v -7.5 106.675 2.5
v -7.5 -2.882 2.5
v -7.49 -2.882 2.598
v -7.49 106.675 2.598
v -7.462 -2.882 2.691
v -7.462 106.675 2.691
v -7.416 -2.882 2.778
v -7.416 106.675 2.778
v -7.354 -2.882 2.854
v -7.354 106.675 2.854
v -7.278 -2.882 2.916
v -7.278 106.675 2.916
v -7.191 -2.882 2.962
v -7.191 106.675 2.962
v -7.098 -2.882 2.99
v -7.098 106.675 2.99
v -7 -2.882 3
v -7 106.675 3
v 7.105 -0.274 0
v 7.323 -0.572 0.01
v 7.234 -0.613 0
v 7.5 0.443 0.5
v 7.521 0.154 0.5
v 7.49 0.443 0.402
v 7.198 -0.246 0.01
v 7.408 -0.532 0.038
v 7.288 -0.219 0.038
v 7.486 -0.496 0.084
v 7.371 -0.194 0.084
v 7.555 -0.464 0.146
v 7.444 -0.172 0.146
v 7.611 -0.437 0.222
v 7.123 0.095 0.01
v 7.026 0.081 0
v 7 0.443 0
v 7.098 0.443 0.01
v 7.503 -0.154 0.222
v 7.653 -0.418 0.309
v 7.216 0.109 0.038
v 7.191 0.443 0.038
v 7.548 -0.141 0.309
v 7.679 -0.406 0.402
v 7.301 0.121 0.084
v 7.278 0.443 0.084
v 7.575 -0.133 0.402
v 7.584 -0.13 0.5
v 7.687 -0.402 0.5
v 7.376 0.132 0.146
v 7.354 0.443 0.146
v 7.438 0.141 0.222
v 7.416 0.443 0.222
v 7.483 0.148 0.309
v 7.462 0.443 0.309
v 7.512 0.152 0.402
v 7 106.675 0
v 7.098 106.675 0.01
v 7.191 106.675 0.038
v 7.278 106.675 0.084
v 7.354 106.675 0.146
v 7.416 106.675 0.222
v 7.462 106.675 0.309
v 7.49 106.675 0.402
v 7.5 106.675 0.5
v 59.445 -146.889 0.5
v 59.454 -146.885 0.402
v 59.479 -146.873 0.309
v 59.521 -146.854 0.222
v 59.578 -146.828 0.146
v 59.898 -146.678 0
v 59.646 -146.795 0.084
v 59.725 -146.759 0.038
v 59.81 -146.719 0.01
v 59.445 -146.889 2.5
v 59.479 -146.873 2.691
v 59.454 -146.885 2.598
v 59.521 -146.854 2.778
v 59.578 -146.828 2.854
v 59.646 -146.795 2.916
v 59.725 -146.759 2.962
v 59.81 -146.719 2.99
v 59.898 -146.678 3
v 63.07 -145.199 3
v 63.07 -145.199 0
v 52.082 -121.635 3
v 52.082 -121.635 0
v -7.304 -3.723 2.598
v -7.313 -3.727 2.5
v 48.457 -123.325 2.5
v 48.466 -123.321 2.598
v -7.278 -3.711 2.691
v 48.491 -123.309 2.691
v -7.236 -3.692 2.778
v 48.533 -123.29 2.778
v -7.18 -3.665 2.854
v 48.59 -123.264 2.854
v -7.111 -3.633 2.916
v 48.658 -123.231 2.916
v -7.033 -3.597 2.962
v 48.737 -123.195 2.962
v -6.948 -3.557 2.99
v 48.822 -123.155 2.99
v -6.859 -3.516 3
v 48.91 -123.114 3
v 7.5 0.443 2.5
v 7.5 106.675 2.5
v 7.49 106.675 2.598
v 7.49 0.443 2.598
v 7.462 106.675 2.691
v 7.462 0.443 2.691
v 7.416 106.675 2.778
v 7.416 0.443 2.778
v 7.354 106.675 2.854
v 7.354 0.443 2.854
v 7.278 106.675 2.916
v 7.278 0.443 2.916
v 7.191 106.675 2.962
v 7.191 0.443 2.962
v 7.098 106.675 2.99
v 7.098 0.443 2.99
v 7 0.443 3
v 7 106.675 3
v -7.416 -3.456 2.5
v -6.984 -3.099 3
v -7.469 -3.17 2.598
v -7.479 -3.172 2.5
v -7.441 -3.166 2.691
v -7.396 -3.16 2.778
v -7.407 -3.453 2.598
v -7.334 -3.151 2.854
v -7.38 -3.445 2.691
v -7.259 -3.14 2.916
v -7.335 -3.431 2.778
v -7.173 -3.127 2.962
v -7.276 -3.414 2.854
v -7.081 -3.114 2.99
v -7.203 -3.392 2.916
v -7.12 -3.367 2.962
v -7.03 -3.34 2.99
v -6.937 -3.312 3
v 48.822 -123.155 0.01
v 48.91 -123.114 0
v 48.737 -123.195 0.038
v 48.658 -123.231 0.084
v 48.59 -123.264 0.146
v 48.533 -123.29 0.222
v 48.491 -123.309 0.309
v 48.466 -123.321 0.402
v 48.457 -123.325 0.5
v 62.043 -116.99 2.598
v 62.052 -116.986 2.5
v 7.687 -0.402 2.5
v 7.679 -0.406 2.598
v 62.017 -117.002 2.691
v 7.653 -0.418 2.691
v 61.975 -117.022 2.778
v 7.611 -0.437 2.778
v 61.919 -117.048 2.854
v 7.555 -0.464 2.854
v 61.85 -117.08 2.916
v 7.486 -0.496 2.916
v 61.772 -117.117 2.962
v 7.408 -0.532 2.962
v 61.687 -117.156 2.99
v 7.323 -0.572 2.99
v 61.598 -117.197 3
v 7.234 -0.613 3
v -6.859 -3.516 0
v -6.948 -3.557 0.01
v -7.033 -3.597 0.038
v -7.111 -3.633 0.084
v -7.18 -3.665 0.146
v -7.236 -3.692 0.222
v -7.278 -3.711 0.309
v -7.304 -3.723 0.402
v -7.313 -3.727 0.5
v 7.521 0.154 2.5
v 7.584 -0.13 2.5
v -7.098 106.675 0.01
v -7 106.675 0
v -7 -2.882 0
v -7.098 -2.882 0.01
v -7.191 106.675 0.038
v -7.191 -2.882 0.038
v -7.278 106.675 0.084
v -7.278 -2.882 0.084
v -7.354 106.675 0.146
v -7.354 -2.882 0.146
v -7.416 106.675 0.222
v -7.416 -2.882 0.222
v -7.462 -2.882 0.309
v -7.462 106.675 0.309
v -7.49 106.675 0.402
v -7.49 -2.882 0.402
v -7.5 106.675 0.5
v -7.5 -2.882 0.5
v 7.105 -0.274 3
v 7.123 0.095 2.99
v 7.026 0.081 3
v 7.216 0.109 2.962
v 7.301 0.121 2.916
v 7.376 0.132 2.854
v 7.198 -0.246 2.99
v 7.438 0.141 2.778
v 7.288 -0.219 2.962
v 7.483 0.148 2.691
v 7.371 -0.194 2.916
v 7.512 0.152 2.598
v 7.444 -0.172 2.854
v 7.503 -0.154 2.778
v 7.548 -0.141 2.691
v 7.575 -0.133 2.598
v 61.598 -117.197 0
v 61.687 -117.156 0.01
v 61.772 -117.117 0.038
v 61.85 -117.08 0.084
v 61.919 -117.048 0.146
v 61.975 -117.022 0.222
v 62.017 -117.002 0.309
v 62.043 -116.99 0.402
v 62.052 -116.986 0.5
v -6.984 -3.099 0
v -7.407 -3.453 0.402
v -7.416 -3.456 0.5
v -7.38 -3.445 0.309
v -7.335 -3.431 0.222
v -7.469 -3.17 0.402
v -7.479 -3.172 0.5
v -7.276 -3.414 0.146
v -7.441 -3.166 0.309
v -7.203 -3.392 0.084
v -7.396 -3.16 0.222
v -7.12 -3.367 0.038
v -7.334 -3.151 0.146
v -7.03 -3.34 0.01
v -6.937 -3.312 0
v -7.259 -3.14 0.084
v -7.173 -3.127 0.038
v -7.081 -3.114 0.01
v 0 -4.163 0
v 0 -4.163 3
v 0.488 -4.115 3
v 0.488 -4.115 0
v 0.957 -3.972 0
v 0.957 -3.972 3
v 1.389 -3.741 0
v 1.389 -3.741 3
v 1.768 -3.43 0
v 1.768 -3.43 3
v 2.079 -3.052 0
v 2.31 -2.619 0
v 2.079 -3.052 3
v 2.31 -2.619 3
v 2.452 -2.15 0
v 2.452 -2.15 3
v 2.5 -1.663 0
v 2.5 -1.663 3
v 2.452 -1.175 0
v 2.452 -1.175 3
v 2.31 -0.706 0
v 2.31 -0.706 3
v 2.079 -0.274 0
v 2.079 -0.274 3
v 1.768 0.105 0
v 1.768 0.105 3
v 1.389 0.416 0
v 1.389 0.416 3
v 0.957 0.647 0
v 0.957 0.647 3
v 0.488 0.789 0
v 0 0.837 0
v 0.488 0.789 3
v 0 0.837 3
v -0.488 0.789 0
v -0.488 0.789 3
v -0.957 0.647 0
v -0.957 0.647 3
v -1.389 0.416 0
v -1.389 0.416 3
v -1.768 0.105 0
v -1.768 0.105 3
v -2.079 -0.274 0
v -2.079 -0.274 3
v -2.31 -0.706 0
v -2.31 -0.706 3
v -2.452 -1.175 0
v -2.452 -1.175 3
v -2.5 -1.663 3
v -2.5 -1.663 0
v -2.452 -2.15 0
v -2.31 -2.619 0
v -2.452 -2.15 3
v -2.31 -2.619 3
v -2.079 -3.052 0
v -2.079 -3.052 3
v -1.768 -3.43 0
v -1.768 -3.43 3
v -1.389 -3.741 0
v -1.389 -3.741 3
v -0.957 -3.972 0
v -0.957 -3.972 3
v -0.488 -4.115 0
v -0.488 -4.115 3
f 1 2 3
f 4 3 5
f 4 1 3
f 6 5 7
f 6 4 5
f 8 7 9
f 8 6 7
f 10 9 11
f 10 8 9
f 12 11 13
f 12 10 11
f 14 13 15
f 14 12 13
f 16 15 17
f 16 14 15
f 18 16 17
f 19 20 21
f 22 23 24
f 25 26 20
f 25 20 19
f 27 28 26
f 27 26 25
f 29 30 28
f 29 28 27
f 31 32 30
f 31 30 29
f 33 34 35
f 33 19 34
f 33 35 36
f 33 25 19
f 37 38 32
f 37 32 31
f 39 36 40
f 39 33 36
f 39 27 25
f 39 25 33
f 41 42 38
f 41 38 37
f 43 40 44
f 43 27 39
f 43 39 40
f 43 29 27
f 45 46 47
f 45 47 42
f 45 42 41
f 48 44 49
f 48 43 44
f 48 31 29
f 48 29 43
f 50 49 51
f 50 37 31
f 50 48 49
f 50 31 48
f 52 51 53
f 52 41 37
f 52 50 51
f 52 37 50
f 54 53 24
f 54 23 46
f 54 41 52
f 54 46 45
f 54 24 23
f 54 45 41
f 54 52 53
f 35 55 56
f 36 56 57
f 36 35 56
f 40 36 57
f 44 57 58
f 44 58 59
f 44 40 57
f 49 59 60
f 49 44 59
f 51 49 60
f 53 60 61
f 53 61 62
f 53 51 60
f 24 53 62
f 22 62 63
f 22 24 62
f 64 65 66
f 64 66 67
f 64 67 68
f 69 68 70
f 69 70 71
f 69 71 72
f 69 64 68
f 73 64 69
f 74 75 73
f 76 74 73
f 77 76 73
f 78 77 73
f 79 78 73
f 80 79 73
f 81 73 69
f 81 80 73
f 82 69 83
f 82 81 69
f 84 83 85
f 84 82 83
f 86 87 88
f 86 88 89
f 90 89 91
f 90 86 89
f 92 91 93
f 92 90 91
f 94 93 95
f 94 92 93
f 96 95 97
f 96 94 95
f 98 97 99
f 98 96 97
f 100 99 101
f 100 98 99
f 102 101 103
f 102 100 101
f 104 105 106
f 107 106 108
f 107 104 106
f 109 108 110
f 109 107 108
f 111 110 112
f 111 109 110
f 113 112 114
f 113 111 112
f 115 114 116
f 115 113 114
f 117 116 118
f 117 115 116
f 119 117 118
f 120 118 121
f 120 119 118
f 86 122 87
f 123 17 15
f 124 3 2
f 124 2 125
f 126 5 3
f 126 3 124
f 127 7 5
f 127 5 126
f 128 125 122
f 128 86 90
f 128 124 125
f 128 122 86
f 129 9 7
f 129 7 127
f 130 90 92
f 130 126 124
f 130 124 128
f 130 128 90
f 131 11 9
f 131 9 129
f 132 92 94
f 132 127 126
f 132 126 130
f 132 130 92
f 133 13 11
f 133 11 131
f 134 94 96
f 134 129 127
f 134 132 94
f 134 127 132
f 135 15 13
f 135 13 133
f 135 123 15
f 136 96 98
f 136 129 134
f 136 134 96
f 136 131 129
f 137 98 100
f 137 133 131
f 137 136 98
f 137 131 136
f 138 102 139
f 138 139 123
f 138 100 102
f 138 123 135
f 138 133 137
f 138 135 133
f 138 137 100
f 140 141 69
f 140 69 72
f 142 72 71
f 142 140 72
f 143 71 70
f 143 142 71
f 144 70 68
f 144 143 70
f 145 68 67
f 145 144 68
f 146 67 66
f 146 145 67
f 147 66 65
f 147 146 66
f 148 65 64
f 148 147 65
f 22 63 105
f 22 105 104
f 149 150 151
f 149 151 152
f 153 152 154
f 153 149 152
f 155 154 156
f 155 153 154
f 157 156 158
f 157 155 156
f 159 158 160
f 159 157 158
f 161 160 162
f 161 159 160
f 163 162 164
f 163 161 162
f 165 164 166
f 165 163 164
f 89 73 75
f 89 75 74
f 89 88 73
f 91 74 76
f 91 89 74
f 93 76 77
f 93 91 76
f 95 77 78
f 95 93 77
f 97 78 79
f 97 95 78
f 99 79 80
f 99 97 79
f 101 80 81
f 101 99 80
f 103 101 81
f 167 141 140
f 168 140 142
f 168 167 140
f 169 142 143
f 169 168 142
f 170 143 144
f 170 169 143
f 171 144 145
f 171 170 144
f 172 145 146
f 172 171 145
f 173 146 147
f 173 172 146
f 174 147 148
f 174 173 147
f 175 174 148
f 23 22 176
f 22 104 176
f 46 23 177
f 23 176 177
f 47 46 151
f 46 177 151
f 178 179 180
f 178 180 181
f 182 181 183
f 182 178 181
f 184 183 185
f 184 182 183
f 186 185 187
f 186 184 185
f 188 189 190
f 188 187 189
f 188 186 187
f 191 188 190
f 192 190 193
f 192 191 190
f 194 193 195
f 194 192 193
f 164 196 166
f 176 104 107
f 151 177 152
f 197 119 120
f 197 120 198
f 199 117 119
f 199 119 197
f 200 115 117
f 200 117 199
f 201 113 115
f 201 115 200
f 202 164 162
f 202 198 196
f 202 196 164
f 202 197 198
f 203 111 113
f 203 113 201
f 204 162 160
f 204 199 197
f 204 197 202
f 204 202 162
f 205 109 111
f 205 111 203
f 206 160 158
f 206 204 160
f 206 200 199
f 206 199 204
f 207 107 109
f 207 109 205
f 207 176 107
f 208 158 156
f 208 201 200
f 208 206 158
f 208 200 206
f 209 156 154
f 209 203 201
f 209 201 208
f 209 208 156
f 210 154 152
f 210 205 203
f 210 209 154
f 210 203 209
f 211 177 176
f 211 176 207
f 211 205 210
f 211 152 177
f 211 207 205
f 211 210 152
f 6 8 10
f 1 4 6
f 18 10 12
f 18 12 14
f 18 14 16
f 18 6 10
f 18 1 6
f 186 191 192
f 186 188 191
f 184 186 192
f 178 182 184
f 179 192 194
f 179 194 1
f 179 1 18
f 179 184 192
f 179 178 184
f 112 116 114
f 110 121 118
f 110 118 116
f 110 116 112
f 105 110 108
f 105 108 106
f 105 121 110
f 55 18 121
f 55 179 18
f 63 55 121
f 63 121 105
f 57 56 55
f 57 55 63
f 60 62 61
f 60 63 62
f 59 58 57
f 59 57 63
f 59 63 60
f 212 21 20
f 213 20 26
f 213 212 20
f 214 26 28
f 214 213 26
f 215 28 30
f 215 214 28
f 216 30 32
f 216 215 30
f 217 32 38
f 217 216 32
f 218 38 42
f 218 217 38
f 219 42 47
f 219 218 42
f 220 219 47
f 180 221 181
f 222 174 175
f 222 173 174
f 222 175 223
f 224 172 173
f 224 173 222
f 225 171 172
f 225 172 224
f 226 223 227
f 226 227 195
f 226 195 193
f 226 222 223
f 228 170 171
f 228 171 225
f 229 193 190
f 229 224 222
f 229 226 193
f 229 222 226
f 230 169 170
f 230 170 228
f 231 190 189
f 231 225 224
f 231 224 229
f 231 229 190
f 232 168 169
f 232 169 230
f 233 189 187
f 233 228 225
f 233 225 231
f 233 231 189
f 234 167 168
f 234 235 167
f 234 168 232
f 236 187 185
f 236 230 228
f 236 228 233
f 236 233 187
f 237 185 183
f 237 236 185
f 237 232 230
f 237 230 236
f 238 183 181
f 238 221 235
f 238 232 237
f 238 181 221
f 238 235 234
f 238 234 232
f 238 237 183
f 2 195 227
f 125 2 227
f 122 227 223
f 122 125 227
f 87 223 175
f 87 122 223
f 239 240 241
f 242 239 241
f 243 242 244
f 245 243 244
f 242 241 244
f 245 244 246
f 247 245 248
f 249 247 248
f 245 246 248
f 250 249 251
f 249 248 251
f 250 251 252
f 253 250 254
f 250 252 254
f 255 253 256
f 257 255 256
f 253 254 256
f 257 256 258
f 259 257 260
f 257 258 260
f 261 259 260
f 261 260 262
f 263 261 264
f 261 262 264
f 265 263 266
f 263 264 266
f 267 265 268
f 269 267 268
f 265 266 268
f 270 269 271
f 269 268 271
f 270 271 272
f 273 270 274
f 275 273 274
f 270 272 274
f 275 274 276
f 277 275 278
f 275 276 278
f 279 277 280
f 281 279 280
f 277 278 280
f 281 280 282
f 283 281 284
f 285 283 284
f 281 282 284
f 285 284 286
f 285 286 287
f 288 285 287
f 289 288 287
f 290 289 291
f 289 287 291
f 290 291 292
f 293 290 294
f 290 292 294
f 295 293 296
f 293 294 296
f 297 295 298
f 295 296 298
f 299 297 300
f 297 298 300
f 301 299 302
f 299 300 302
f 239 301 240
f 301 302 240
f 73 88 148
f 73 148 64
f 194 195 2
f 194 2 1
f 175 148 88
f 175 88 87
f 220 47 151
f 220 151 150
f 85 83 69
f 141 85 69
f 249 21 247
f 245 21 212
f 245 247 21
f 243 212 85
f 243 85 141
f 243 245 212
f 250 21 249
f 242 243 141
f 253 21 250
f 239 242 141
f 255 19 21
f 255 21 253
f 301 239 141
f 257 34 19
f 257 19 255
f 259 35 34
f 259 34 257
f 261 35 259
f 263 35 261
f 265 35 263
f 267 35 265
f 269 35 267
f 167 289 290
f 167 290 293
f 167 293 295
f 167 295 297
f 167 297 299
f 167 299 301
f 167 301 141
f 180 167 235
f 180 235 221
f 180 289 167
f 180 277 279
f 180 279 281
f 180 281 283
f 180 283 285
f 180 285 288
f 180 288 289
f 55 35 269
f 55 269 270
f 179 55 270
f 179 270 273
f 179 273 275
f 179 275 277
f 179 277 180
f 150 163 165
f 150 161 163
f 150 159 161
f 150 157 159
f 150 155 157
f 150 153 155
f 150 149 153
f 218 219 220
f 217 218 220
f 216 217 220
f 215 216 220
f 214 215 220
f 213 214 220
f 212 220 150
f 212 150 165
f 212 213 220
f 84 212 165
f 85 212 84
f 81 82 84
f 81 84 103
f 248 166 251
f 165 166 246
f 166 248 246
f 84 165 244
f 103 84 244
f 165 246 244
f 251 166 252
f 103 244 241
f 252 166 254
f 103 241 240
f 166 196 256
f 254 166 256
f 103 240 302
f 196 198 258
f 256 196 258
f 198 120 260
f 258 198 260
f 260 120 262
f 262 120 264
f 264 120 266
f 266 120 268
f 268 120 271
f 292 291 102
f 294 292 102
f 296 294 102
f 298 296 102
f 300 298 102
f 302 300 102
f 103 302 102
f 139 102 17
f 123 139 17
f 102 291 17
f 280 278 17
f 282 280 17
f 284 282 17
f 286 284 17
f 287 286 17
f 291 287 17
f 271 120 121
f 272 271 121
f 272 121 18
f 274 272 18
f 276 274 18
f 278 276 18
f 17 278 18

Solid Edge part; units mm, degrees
sketch "Sketch1" plane through (0, 0, 0) normal (0, 0, 1) x (1, 0, 0)
  line L0 (48.4569, -123.3254) -> (-7.5, -3.3254)
  line L1 (-7.5, -3.3254) -> (-7.5, 106.6746)
  line L2 (-7.5, 106.6746) -> (7.5, 106.6746)
  line L3 (7.5, 106.6746) -> (7.5, 0)
  line L4 (7.5, 0) -> (62.0515, -116.9861)
  line L5 (62.0515, -116.9861) -> (48.4569, -123.3254)
extrude "Protrusion1" add sketch "Sketch1" along normal blind 3
sketch "Sketch2" plane through (33.3013, -25.359, 3) normal (0, 0, 1) x (0, -1, 0)
  line L0 (121.5304, 26.1437) -> (119.84, 29.769)
  line L1 (119.84, 29.769) -> (96.276, 18.7809)
  line L2 (96.276, 18.7809) -> (97.9664, 15.1556)
  line L3 (97.9664, 15.1556) -> (121.5304, 26.1437)
extrude "Protrusion2" add sketch "Sketch2" against normal up to surface (3 mm away)
sketch "Sketch3" plane through (35.3731, -35.2776, 3) normal (0, 0, 1) x (0, -1, 0)
  circle A0 centre (-33.6149, -35.3731) radius 2.5
extrude "Cutout1" cut sketch "Sketch3" against normal up to next
fillet "Arrondis_angles" radius 2 2 edges at (-7.5, -3.3254, 1.5) (7.5, 0, 1.5)
fillet "Arrondis_0" radius 0.5 8 edges at (26.0662, -75.3083, 0) (26.0662, -75.3083, 3) (34.8695, -58.694, 0) (34.8695, -58.694, 3) (-7.5, 51.8963, 3) (7.5, 53.559, 3) (7.5, 53.559, 0) (-7.5, 51.8963, 0)
